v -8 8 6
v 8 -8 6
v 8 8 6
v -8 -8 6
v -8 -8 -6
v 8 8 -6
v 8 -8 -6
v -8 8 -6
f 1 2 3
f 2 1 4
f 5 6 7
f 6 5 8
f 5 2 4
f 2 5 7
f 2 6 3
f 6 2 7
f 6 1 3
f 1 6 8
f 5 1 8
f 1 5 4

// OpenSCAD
// file: lib/geometry.scad
module make_block(w = 16, h = 12) {
    cube([w, w, h], center = true);
}
// main file
use <lib/geometry.scad>;

/* [Dimensions] */
width = 16; // [8:1:28]
height = 12; // [4:1:22]

// Additional editable values exercise desktop and mobile parameter overflow.
fixture_extra_01 = 1; // [0:1:100]
fixture_extra_02 = 2; // [0:1:100]
fixture_extra_03 = 3; // [0:1:100]
fixture_extra_04 = 4; // [0:1:100]
fixture_extra_05 = 5; // [0:1:100]
fixture_extra_06 = 6; // [0:1:100]
fixture_extra_07 = 7; // [0:1:100]
fixture_extra_08 = 8; // [0:1:100]
fixture_extra_09 = 9; // [0:1:100]
fixture_extra_10 = 10; // [0:1:100]
fixture_extra_11 = 11; // [0:1:100]
fixture_extra_12 = 12; // [0:1:100]
fixture_extra_13 = 13; // [0:1:100]
fixture_extra_14 = 14; // [0:1:100]
fixture_extra_15 = 15; // [0:1:100]
fixture_extra_16 = 16; // [0:1:100]
fixture_extra_17 = 17; // [0:1:100]
fixture_extra_18 = 18; // [0:1:100]
fixture_extra_19 = 19; // [0:1:100]
fixture_extra_20 = 20; // [0:1:100]
fixture_extra_21 = 21; // [0:1:100]
fixture_extra_22 = 22; // [0:1:100]
fixture_extra_23 = 23; // [0:1:100]
fixture_extra_24 = 24; // [0:1:100]

make_block(width, height);
